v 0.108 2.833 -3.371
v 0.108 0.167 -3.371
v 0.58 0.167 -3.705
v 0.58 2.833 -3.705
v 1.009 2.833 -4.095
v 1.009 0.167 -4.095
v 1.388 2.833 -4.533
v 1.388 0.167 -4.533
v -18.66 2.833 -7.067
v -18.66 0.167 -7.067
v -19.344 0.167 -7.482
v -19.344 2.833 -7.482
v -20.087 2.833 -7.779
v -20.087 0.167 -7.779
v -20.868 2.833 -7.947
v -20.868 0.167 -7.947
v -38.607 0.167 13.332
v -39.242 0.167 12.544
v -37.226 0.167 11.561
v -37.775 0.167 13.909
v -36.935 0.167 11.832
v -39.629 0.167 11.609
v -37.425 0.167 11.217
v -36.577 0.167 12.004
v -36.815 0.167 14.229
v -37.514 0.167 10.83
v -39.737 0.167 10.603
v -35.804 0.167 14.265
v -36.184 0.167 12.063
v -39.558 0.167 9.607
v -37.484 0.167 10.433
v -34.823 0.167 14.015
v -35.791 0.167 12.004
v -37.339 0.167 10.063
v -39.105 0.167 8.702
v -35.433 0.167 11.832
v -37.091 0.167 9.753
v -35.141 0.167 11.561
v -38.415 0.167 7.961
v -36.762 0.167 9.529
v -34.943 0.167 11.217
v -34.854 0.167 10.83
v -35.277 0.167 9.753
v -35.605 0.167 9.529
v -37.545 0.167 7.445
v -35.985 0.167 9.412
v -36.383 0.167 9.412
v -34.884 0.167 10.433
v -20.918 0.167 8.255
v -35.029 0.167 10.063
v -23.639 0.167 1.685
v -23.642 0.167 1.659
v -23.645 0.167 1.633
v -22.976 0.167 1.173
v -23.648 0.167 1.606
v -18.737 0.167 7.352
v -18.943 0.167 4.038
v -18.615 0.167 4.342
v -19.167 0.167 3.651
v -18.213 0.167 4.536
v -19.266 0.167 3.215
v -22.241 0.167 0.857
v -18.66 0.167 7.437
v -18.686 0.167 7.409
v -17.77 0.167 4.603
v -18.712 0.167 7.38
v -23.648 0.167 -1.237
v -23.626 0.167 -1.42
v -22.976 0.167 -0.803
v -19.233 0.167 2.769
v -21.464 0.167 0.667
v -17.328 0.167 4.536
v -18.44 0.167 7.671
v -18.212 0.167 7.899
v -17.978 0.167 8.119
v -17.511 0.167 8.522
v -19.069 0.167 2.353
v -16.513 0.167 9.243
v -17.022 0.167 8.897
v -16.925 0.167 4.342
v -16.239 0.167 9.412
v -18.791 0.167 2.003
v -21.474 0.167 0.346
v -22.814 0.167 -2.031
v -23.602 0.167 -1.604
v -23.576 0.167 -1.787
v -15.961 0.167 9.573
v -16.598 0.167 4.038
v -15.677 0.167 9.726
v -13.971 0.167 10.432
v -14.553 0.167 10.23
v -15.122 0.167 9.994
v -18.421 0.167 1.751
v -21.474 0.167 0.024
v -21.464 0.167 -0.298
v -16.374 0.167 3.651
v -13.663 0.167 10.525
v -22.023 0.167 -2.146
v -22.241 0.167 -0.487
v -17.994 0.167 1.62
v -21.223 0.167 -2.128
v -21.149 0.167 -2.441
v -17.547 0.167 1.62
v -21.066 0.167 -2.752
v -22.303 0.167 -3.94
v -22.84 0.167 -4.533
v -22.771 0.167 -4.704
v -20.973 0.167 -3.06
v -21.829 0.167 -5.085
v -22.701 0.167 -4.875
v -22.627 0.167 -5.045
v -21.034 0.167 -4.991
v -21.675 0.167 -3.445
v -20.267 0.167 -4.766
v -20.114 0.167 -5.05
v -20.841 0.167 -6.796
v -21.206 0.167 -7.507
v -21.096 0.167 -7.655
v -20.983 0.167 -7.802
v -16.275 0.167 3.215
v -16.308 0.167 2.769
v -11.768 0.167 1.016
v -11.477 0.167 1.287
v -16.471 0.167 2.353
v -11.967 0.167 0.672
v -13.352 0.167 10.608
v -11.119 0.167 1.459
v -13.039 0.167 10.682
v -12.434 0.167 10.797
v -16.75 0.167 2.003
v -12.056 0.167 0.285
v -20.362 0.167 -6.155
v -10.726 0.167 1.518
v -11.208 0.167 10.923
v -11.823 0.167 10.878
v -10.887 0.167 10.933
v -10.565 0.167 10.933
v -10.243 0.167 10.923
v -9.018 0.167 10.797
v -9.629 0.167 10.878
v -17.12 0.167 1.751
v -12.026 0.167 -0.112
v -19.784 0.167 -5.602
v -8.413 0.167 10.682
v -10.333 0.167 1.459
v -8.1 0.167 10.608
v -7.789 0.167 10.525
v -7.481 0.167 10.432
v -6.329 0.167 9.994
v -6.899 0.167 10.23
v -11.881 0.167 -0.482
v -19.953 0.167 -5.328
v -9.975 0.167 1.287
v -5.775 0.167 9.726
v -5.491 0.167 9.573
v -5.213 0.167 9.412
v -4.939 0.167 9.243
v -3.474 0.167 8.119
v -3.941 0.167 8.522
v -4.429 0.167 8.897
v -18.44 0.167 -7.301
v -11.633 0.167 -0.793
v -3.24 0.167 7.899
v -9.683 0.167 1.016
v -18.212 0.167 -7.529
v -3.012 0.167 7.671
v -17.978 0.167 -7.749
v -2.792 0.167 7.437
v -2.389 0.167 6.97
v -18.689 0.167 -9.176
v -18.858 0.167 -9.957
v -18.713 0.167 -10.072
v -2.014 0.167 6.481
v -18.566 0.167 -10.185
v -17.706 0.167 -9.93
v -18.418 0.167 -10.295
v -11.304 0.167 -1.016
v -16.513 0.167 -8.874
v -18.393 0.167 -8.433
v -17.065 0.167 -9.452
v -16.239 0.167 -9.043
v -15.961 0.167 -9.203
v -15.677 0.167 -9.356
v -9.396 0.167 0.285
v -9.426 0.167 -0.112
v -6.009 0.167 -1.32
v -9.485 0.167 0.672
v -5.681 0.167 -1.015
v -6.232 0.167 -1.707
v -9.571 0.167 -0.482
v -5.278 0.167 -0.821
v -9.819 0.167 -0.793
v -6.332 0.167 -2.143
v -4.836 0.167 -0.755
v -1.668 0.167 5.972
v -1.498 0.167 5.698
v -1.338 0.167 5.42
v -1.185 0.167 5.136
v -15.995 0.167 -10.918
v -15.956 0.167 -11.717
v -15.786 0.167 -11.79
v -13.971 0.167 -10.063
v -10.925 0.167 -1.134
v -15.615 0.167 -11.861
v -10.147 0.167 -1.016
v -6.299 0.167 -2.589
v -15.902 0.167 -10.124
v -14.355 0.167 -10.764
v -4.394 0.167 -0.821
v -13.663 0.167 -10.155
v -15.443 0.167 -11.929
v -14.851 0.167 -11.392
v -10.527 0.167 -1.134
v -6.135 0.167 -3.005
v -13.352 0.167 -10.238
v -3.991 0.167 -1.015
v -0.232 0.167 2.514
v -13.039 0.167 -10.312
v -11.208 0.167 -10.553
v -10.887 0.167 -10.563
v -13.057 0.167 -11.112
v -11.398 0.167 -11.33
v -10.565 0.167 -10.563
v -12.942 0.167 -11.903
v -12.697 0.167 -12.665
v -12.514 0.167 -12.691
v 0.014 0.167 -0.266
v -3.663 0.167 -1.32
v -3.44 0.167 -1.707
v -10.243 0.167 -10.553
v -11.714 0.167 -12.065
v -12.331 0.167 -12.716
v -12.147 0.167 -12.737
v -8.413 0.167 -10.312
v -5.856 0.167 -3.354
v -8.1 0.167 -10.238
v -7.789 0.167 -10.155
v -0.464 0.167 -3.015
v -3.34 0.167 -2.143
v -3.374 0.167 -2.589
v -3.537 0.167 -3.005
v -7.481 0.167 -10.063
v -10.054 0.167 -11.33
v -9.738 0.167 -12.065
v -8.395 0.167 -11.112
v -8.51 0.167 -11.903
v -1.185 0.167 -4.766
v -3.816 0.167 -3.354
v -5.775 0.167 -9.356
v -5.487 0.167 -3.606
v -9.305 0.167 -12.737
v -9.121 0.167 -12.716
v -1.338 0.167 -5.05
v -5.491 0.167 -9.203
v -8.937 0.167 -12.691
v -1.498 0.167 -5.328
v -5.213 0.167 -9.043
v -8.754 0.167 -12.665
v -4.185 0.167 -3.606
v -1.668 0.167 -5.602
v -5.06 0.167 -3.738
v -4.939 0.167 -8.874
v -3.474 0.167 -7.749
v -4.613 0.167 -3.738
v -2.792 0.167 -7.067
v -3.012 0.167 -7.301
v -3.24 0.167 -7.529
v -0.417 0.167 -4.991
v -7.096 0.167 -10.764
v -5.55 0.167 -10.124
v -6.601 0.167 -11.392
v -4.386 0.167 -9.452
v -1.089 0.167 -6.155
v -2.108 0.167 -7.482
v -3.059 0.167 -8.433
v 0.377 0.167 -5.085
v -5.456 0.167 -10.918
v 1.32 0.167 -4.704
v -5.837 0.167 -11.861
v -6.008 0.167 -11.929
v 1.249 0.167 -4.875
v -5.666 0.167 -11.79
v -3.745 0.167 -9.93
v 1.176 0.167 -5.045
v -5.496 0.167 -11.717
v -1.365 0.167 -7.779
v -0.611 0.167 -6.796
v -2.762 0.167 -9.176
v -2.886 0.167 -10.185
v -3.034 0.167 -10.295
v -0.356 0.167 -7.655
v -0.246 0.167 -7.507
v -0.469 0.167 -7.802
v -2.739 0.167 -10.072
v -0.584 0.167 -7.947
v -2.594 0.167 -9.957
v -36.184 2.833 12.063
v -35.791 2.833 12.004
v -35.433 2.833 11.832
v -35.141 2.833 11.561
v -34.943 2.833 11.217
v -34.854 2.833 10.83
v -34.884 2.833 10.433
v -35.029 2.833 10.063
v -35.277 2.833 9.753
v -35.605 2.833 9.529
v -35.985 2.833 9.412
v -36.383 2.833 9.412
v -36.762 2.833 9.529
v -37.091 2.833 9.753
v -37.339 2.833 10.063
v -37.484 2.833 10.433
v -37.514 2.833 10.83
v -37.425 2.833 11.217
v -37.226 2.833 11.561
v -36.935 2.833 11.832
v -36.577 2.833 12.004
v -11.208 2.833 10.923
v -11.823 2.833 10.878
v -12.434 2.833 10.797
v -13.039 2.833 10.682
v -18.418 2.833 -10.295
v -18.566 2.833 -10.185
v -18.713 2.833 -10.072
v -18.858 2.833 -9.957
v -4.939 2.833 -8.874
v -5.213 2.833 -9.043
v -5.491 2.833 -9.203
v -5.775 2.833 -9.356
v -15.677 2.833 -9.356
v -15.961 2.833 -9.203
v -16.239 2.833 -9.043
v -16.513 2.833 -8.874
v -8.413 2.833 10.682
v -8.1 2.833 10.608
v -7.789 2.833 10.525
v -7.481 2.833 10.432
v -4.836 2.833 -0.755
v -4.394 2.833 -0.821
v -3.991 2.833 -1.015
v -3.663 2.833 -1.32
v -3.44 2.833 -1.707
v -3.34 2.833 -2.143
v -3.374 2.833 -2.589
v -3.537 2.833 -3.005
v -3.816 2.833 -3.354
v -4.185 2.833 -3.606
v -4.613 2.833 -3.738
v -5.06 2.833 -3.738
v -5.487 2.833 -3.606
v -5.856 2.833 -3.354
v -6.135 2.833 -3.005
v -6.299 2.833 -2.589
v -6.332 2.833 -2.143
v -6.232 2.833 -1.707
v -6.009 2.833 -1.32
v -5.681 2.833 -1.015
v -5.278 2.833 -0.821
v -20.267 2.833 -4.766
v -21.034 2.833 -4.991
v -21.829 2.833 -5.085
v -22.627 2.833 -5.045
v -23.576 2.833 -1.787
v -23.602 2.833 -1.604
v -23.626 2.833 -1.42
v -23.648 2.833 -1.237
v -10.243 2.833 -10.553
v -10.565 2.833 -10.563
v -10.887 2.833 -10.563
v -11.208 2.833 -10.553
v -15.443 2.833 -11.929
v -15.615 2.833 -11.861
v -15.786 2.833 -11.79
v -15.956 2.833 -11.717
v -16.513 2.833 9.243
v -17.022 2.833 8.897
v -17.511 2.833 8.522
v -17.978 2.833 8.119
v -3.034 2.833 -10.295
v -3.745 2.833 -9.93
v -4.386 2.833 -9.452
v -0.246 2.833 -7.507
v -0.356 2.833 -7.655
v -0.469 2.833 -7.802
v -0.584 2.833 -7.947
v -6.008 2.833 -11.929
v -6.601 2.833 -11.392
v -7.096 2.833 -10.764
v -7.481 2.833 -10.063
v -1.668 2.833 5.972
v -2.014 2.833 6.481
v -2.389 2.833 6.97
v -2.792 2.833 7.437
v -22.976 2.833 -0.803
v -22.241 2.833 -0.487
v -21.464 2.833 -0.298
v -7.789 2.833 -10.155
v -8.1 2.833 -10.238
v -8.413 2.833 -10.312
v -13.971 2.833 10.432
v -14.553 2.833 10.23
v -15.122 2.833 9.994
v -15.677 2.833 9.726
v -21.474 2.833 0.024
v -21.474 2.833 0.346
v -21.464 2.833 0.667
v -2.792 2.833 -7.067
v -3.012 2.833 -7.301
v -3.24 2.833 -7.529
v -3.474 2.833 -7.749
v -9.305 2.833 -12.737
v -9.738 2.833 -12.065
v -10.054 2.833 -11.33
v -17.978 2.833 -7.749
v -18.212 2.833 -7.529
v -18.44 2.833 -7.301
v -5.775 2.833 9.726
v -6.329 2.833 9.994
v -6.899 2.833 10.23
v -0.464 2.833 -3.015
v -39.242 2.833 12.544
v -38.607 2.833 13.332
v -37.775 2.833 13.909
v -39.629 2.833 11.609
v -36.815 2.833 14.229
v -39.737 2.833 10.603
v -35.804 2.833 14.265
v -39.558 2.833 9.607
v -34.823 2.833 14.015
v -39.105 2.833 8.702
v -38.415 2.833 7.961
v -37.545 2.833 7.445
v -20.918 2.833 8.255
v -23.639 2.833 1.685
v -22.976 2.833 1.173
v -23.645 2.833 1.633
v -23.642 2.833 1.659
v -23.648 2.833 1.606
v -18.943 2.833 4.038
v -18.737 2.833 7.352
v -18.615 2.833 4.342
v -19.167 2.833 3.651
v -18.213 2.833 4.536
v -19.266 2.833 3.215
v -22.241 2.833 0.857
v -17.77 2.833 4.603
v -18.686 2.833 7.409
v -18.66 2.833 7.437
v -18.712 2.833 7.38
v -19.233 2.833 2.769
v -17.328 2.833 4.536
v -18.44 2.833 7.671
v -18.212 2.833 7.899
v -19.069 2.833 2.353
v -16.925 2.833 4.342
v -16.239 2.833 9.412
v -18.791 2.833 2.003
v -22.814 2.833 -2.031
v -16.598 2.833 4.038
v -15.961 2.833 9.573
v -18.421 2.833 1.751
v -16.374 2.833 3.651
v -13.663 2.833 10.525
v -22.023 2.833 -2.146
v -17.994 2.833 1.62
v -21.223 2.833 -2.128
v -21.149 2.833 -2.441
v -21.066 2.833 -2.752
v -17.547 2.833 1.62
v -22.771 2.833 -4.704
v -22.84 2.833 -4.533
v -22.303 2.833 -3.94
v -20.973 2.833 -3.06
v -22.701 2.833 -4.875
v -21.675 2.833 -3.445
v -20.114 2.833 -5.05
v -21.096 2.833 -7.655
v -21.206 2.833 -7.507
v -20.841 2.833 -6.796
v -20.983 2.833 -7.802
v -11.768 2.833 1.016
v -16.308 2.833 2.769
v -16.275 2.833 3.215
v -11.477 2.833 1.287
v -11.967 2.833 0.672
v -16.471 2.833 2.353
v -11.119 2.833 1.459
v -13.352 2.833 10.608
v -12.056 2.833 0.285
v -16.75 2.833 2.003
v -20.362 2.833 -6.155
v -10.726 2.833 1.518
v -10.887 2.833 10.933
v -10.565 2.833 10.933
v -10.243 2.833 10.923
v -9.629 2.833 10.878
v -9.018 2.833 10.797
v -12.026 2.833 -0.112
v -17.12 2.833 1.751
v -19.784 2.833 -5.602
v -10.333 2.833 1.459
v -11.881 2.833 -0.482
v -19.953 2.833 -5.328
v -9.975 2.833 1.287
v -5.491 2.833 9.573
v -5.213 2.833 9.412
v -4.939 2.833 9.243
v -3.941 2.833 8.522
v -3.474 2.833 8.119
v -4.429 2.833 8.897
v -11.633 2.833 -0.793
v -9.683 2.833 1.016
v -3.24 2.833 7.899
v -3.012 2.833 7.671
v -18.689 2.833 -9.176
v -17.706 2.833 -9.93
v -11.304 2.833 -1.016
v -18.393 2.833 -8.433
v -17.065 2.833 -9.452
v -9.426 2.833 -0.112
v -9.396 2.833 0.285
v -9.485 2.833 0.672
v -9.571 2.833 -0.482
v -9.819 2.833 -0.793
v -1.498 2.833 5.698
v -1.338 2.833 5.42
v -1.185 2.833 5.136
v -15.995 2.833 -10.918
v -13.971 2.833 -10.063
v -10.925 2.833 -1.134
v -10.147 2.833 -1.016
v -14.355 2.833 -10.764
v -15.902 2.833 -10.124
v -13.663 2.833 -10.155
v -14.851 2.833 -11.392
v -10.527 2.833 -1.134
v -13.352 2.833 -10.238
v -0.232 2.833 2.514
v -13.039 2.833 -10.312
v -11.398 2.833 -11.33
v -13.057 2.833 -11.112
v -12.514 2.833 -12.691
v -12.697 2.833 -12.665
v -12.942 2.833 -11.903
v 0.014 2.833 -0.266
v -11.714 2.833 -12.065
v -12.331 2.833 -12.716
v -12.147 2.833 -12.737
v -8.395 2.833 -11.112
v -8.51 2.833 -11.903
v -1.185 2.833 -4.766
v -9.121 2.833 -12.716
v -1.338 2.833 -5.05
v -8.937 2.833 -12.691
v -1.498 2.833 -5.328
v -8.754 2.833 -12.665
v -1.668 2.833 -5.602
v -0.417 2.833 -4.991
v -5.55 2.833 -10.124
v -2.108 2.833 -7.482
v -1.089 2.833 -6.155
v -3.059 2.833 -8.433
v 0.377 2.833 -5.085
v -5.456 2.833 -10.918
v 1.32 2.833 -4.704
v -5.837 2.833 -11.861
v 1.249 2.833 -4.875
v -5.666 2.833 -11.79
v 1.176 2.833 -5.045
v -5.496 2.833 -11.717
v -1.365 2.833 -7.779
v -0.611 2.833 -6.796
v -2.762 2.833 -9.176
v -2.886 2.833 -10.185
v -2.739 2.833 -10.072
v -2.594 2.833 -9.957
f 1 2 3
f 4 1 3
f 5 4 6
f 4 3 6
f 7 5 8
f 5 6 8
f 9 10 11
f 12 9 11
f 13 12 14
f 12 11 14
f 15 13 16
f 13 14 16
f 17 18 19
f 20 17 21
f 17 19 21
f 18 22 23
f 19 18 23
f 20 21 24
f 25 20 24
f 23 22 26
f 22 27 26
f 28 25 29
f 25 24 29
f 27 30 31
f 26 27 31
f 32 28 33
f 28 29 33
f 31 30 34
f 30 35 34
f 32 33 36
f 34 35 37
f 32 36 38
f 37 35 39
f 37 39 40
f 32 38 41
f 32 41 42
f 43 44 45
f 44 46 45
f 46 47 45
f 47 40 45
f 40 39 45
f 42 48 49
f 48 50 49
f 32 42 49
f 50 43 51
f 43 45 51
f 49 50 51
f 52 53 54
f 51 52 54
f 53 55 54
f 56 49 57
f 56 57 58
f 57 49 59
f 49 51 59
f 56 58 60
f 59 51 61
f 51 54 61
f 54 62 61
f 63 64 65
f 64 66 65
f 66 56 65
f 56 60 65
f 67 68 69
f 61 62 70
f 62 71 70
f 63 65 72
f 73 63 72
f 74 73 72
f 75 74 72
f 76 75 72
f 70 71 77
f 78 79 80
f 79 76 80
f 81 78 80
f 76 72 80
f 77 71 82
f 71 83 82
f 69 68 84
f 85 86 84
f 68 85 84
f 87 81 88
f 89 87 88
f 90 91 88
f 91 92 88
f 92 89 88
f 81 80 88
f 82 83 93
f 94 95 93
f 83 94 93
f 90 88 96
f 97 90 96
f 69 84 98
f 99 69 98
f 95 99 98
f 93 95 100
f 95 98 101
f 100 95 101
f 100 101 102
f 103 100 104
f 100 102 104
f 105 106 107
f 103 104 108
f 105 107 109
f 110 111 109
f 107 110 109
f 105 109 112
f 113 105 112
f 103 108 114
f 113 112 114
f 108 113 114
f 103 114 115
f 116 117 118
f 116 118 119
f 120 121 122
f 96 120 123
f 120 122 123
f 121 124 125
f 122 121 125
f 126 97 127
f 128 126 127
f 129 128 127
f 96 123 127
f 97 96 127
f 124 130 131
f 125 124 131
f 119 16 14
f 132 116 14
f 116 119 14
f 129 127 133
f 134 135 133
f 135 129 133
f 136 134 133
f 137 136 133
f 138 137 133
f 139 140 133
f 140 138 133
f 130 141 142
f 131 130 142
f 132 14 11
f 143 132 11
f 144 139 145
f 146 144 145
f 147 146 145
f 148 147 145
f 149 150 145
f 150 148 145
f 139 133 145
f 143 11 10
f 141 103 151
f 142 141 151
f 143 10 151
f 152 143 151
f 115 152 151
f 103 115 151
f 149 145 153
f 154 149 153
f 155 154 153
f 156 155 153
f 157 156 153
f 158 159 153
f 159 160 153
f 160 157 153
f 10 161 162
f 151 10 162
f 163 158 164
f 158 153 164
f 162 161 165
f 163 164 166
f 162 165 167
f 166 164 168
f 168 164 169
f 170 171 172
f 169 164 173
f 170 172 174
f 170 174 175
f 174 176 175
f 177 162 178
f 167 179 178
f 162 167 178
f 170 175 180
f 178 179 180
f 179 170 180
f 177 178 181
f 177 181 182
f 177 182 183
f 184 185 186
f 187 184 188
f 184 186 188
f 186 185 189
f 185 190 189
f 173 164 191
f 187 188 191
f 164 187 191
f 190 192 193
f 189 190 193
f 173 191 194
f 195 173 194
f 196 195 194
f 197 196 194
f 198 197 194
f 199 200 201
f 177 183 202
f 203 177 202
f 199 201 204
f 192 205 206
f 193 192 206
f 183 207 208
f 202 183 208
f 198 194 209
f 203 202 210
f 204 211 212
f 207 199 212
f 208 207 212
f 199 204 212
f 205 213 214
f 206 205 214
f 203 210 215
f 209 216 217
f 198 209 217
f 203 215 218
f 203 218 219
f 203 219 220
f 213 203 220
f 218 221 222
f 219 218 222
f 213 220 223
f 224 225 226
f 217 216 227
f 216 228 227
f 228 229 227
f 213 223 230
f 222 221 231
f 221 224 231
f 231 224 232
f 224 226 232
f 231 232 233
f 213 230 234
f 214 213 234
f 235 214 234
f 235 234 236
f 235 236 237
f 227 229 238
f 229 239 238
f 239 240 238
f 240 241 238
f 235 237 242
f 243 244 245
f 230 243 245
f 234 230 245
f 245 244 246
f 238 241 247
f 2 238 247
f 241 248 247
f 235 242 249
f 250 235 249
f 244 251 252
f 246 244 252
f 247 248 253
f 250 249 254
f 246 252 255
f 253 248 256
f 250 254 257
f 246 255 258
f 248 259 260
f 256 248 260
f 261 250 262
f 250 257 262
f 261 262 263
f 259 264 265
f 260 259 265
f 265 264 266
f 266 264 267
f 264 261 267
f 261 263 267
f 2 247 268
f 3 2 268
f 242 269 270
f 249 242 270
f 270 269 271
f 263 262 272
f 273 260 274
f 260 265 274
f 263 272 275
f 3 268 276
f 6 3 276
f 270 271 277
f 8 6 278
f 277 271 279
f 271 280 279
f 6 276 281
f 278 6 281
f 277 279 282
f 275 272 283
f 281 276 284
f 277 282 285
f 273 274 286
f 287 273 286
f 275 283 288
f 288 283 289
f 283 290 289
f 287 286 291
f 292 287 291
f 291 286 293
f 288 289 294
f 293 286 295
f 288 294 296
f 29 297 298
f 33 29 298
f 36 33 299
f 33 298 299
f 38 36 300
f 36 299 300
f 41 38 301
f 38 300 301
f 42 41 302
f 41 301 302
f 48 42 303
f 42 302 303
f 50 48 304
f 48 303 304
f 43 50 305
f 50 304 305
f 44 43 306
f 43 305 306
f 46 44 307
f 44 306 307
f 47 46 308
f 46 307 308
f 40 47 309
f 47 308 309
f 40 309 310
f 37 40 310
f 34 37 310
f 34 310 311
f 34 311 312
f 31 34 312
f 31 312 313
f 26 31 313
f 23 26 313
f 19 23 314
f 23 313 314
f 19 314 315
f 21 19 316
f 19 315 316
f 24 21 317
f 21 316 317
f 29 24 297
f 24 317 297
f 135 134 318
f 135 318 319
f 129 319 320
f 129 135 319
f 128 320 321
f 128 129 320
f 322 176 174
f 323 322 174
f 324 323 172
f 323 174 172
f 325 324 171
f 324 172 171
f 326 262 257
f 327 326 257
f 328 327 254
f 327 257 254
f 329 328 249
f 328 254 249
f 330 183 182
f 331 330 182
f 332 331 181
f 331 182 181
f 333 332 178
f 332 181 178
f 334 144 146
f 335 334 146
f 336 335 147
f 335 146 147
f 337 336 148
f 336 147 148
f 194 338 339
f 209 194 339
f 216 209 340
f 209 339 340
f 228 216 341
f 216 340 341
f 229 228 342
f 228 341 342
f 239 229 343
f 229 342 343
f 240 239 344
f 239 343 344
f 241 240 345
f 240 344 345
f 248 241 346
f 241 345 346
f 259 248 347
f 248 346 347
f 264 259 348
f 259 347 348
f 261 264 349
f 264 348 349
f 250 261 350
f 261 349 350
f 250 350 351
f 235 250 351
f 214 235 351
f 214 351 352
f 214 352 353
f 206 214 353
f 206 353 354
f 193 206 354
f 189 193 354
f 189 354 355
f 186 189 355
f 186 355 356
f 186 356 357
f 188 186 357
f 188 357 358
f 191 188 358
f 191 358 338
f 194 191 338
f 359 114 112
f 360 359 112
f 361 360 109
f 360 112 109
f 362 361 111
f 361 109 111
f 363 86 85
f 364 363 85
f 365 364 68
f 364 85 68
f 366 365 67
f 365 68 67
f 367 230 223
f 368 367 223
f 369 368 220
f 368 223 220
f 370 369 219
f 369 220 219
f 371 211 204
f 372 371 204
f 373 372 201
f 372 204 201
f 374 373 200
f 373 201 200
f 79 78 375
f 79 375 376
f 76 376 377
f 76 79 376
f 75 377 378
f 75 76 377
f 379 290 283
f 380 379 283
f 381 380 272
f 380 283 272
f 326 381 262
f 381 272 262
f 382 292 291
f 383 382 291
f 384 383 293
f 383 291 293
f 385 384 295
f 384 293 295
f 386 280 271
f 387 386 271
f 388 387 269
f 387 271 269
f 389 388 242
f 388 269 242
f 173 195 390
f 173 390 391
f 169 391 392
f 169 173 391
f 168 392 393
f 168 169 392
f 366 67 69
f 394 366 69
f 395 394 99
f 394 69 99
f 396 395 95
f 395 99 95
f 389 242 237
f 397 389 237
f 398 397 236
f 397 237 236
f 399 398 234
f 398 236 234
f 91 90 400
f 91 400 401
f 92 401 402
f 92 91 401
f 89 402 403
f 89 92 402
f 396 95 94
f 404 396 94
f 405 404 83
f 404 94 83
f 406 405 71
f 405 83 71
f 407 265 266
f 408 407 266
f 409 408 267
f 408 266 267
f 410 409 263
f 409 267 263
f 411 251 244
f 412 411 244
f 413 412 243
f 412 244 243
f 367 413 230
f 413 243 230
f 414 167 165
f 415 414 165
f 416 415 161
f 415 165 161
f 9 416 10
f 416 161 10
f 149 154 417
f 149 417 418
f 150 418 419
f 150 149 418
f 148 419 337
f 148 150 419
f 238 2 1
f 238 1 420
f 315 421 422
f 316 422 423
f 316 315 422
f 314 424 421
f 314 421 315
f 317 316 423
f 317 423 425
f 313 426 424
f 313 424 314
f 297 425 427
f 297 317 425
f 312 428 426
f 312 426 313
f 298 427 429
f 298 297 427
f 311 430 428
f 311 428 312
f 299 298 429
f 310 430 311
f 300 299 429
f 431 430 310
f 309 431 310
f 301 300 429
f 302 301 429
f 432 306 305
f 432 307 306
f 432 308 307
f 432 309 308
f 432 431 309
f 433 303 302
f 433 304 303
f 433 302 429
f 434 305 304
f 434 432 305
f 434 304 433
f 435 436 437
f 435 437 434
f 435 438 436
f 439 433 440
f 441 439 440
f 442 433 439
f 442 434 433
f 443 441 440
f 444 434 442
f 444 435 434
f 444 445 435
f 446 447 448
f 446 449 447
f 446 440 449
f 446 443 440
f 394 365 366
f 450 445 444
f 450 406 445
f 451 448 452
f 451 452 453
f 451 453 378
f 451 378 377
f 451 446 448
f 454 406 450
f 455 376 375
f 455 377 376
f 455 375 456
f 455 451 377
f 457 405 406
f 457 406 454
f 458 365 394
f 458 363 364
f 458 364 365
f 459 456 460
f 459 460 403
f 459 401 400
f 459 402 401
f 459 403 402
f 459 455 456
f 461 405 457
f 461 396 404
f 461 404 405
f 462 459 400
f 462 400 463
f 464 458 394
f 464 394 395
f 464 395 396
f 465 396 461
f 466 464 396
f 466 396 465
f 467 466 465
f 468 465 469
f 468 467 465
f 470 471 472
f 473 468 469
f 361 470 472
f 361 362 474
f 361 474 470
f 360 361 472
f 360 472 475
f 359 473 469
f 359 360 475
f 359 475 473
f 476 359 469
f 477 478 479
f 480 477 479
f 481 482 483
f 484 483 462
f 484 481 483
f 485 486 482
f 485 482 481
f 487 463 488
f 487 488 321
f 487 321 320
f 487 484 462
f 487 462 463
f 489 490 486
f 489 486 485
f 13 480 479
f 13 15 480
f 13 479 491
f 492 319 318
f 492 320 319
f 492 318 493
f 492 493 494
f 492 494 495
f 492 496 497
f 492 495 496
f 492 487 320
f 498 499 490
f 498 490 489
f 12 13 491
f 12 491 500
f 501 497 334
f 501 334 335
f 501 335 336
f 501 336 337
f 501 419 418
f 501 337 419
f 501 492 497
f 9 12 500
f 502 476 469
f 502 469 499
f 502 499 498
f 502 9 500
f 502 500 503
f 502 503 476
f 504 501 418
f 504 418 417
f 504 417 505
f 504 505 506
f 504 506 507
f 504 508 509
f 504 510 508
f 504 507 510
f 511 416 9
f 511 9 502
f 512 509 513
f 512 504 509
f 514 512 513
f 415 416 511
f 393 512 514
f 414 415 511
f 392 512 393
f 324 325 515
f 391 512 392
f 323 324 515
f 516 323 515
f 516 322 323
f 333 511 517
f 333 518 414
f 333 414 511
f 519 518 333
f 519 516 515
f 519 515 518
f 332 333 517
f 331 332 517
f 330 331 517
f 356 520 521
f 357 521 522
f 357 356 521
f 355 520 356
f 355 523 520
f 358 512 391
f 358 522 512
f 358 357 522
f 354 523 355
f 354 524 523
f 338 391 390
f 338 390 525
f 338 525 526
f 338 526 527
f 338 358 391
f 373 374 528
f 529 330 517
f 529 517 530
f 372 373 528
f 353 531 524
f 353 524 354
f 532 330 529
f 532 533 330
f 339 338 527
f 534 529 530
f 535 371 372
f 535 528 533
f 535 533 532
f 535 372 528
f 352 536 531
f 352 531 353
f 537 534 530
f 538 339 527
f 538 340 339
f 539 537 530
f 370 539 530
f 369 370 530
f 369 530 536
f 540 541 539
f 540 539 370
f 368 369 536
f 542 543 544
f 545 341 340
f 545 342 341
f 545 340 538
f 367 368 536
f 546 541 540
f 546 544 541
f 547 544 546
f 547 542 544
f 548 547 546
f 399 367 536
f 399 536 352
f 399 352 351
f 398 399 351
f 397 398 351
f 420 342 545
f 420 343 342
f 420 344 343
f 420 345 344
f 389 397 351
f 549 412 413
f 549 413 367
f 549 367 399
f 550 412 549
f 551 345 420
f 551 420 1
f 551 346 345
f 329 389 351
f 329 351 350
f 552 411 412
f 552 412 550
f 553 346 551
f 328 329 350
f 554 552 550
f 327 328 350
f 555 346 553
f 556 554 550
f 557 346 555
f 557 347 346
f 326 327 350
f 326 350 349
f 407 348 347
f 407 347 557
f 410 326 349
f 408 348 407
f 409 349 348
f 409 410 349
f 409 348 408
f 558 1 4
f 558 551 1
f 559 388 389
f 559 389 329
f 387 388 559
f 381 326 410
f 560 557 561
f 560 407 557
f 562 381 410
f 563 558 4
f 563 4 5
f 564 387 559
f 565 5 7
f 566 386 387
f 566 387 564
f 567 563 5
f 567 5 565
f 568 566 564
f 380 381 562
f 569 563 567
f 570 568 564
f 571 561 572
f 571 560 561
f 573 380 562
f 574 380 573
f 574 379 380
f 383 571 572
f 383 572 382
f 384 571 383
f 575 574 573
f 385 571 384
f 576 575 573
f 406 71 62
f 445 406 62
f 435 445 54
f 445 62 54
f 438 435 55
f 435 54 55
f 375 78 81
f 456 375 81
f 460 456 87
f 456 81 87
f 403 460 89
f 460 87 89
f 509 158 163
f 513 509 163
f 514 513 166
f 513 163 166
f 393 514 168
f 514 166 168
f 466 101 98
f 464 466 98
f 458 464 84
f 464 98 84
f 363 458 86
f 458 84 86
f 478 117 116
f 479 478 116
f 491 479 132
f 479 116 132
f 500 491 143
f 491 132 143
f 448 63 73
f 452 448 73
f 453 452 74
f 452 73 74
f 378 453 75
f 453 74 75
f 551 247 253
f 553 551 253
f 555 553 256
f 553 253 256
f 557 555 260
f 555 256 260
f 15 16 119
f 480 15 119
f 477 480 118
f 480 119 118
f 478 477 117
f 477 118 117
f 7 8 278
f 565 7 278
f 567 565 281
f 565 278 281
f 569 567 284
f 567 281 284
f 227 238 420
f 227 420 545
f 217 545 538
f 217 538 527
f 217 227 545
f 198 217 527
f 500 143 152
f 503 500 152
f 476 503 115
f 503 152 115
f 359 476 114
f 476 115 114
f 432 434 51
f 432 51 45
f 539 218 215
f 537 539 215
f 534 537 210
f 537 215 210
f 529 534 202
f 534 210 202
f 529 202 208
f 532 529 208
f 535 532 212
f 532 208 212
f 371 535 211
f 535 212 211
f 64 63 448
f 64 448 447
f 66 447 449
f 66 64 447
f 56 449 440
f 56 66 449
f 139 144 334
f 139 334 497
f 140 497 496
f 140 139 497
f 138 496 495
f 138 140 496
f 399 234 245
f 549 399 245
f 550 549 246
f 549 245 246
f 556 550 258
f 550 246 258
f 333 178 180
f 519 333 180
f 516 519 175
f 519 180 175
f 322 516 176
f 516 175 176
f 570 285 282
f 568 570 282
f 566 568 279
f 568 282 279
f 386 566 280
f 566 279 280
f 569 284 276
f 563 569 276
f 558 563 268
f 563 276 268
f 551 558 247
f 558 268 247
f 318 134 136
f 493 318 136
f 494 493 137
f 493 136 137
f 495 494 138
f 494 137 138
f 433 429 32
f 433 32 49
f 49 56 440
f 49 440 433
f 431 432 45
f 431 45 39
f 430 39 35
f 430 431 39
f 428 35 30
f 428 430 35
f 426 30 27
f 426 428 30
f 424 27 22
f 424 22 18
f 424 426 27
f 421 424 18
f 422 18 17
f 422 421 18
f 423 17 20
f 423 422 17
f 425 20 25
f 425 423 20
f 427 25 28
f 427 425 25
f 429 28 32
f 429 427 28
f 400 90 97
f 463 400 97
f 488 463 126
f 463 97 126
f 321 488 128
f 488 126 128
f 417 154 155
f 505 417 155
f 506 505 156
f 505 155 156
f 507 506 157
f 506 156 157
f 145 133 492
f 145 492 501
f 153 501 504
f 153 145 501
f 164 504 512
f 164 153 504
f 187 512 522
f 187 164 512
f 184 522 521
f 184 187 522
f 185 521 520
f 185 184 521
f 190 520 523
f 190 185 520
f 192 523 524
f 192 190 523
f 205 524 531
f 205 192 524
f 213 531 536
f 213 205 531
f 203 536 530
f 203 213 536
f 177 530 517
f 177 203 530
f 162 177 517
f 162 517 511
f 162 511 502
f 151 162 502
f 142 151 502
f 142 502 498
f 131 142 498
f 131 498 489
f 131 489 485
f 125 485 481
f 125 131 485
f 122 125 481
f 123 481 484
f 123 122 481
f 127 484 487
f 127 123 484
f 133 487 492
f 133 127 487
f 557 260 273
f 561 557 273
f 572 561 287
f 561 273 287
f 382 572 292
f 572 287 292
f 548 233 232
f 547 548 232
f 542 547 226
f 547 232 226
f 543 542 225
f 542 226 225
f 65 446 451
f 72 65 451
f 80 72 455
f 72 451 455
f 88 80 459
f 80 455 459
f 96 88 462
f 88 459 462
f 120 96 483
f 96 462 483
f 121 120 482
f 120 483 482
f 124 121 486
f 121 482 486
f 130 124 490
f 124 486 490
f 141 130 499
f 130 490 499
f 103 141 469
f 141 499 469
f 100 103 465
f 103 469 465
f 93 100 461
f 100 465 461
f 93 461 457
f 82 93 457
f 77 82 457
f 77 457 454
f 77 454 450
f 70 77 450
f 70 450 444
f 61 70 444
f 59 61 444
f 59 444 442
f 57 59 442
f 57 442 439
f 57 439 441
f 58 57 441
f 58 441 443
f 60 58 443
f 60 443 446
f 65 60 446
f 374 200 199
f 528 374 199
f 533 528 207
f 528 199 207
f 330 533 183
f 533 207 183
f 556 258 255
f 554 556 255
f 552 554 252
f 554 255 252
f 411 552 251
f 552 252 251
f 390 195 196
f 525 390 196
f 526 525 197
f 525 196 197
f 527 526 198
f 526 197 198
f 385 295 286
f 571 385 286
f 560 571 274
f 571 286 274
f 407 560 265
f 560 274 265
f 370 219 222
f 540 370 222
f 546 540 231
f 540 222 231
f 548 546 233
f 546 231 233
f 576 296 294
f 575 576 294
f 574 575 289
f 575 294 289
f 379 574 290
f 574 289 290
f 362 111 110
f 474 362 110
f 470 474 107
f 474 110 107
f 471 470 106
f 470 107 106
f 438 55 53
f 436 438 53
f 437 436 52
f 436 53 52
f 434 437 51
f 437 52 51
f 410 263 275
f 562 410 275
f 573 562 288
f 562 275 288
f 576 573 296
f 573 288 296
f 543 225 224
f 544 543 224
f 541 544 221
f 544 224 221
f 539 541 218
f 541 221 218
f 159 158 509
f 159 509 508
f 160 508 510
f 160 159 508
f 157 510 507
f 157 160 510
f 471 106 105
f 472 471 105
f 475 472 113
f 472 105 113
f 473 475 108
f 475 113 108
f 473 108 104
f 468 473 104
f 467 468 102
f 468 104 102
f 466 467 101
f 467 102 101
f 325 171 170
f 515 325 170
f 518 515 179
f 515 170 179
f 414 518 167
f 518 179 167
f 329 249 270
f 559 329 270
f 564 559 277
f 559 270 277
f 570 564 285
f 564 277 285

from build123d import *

# Parameters (mm, degrees)
SKETCH1_R              = 1.5
BOSS_EXTRUDE1_DEPTH    = 3
SKETCH3_R              = 1.5
BOSS_EXTRUDE2_DEPTH    = 3
CUT_EXTRUDE1_OUTLINE_R = 1.5
CUT_EXTRUDE1_DEPTH     = 3
SCALE1_SCALE           = 0.888888889
BOSS_EXTRUDE3_START    = -2.666666667
SKETCH5_R              = 1.333333333
BOSS_EXTRUDE3_DEPTH    = 2.666666667
SKETCH6_R              = 1.5
CUT_EXTRUDE2_DEPTH     = 10


# Read off the part's stored shape, not the designer's step: Cut-Extrude1
with BuildPart() as part:
    # Sketch1 → Boss-Extrude1 (new body)
    with BuildSketch(Plane(origin=(0, 0, 0), x_dir=(1, 0, 0), z_dir=(0, 1, 0))):
        with BuildLine():
            Line((20.643657446, 4), (2.081641936, 4))
            ThreePointArc((2.081641936, 4), (2.861028333, 4.588201733), (3.521749436, 5.30713988))
            ThreePointArc((3.521749436, 5.30713988), (3.405395609, 5.596745198), (3.282888305, 5.883801663))
            ThreePointArc((3.282888305, 5.883801663), (1.93527598, 5.894040025), (0.627094961, 5.57027124))
            ThreePointArc((0.627094961, 5.57027124), (0.366286148, 6.046375), (0.084372603, 6.510293938))
            ThreePointArc((0.084372603, 6.510293938), (1.018855105, 7.48132754), (1.683794586, 8.65351323))
            ThreePointArc((1.683794586, 8.65351323), (1.496450048, 8.903135899), (1.303821399, 9.148703928))
            ThreePointArc((1.303821399, 9.148703928), (-0.000522033, 8.809805691), (-1.180330337, 8.158486898))
            ThreePointArc((-1.180330337, 8.158486898), (-1.555477026, 8.550865528), (-1.947855656, 8.926012217))
            ThreePointArc((-1.947855656, 8.926012217), (-1.296536862, 10.105820521), (-0.957638625, 11.410163953))
            ThreePointArc((-0.957638625, 11.410163953), (-1.203206655, 11.602792602), (-1.452829324, 11.79013714))
            ThreePointArc((-1.452829324, 11.79013714), (-2.625015014, 11.125197659), (-3.596048616, 10.190715157))
            ThreePointArc((-3.596048616, 10.190715157), (-4.059967554, 10.472628702), (-4.536071314, 10.733437515))
            ThreePointArc((-4.536071314, 10.733437515), (-4.212302529, 12.041618533), (-4.222540891, 13.389230859))
            ThreePointArc((-4.222540891, 13.389230859), (-4.509597355, 13.511738163), (-4.799202674, 13.62809199))
            ThreePointArc((-4.799202674, 13.62809199), (-5.759348103, 12.682425791), (-6.455432668, 11.528463019))
            ThreePointArc((-6.455432668, 11.528463019), (-6.976508546, 11.680699536), (-7.503891752, 11.809396783))
            ThreePointArc((-7.503891752, 11.809396783), (-7.529737283, 13.156800143), (-7.888414517, 14.455843809))
            ThreePointArc((-7.888414517, 14.455843809), (-8.197396993, 14.499881098), (-8.507248835, 14.537314892))
            ThreePointArc((-8.507248835, 14.537314892), (-9.18992168, 13.375367565), (-9.563620196, 12.080565177))
            ThreePointArc((-9.563620196, 12.080565177), (-10.106342554, 12.09275), (-10.649064912, 12.080565177))
            ThreePointArc((-10.649064912, 12.080565177), (-11.022763428, 13.375367565), (-11.705436272, 14.537314892))
            ThreePointArc((-11.705436272, 14.537314892), (-12.015288115, 14.499881098), (-12.324270591, 14.455843809))
            ThreePointArc((-12.324270591, 14.455843809), (-12.682947825, 13.156800143), (-12.708793355, 11.809396783))
            ThreePointArc((-12.708793355, 11.809396783), (-13.236176561, 11.680699536), (-13.757252439, 11.528463019))
            ThreePointArc((-13.757252439, 11.528463019), (-14.453337005, 12.682425791), (-15.413482434, 13.62809199))
            ThreePointArc((-15.413482434, 13.62809199), (-15.703087752, 13.511738163), (-15.990144217, 13.389230859))
            ThreePointArc((-15.990144217, 13.389230859), (-16.000382579, 12.041618533), (-15.676613793, 10.733437515))
            ThreePointArc((-15.676613793, 10.733437515), (-16.152717554, 10.472628702), (-16.616636492, 10.190715157))
            ThreePointArc((-16.616636492, 10.190715157), (-17.587670094, 11.125197659), (-18.759855783, 11.79013714))
            ThreePointArc((-18.759855783, 11.79013714), (-19.009478453, 11.602792602), (-19.255046482, 11.410163953))
            ThreePointArc((-19.255046482, 11.410163953), (-18.916148245, 10.105820521), (-18.264829452, 8.926012217))
            ThreePointArc((-18.264829452, 8.926012217), (-18.657208082, 8.550865528), (-19.032354771, 8.158486898))
            ThreePointArc((-19.032354771, 8.158486898), (-20.212163074, 8.809805691), (-21.516506507, 9.148703928))
            ThreePointArc((-21.516506507, 9.148703928), (-21.709135156, 8.903135899), (-21.896479694, 8.65351323))
            ThreePointArc((-21.896479694, 8.65351323), (-21.231540213, 7.48132754), (-20.297057711, 6.510293938))
            ThreePointArc((-20.297057711, 6.510293938), (-20.578971255, 6.046375), (-20.839780068, 5.57027124))
            ThreePointArc((-20.839780068, 5.57027124), (-22.147961087, 5.894040025), (-23.495573413, 5.883801663))
            ThreePointArc((-23.495573413, 5.883801663), (-23.618080717, 5.596745198), (-23.734434544, 5.30713988))
            ThreePointArc((-23.734434544, 5.30713988), (-22.788768345, 4.346994451), (-21.634805572, 3.650909885))
            ThreePointArc((-21.634805572, 3.650909885), (-21.78704209, 3.129834008), (-21.915739337, 2.602450802))
            ThreePointArc((-21.915739337, 2.602450802), (-23.263142697, 2.576605271), (-24.562186363, 2.217928037))
            ThreePointArc((-24.562186363, 2.217928037), (-24.606223651, 1.908945561), (-24.643657446, 1.599093719))
            ThreePointArc((-24.643657446, 1.599093719), (-23.481710119, 0.916420874), (-22.186907731, 0.542722358))
            ThreePointArc((-22.186907731, 0.542722358), (-22.199092554, 0), (-22.186907731, -0.542722358))
            ThreePointArc((-22.186907731, -0.542722358), (-23.481710119, -0.916420874), (-24.643657446, -1.599093719))
            ThreePointArc((-24.643657446, -1.599093719), (-24.606223651, -1.908945561), (-24.562186363, -2.217928037))
            ThreePointArc((-24.562186363, -2.217928037), (-23.263142697, -2.576605271), (-21.915739337, -2.602450802))
            ThreePointArc((-21.915739337, -2.602450802), (-21.78704209, -3.129834008), (-21.634805572, -3.650909885))
            ThreePointArc((-21.634805572, -3.650909885), (-22.788768345, -4.346994451), (-23.734434544, -5.30713988))
            ThreePointArc((-23.734434544, -5.30713988), (-23.618080717, -5.596745198), (-23.495573413, -5.883801663))
            ThreePointArc((-23.495573413, -5.883801663), (-22.147961087, -5.894040025), (-20.839780068, -5.57027124))
            ThreePointArc((-20.839780068, -5.57027124), (-20.578971255, -6.046375), (-20.297057711, -6.510293938))
            ThreePointArc((-20.297057711, -6.510293938), (-21.231540213, -7.48132754), (-21.896479694, -8.65351323))
            ThreePointArc((-21.896479694, -8.65351323), (-21.709135156, -8.903135899), (-21.516506507, -9.148703928))
            ThreePointArc((-21.516506507, -9.148703928), (-20.212163074, -8.809805691), (-19.032354771, -8.158486898))
            ThreePointArc((-19.032354771, -8.158486898), (-18.657208082, -8.550865528), (-18.264829452, -8.926012217))
            ThreePointArc((-18.264829452, -8.926012217), (-18.916148245, -10.105820521), (-19.255046482, -11.410163953))
            ThreePointArc((-19.255046482, -11.410163953), (-19.009478453, -11.602792602), (-18.759855783, -11.79013714))
            ThreePointArc((-18.759855783, -11.79013714), (-17.587670094, -11.125197659), (-16.616636492, -10.190715157))
            ThreePointArc((-16.616636492, -10.190715157), (-16.152717554, -10.472628702), (-15.676613793, -10.733437515))
            ThreePointArc((-15.676613793, -10.733437515), (-16.000382579, -12.041618533), (-15.990144217, -13.389230859))
            ThreePointArc((-15.990144217, -13.389230859), (-15.703087752, -13.511738163), (-15.413482434, -13.62809199))
            ThreePointArc((-15.413482434, -13.62809199), (-14.453337005, -12.682425791), (-13.757252439, -11.528463019))
            ThreePointArc((-13.757252439, -11.528463019), (-13.236176561, -11.680699536), (-12.708793355, -11.809396783))
            ThreePointArc((-12.708793355, -11.809396783), (-12.682947825, -13.156800143), (-12.324270591, -14.455843809))
            ThreePointArc((-12.324270591, -14.455843809), (-12.015288115, -14.499881098), (-11.705436272, -14.537314892))
            ThreePointArc((-11.705436272, -14.537314892), (-11.022763428, -13.375367565), (-10.649064912, -12.080565177))
            ThreePointArc((-10.649064912, -12.080565177), (-10.106342554, -12.09275), (-9.563620196, -12.080565177))
            ThreePointArc((-9.563620196, -12.080565177), (-9.18992168, -13.375367565), (-8.507248835, -14.537314892))
            ThreePointArc((-8.507248835, -14.537314892), (-8.197396993, -14.499881098), (-7.888414517, -14.455843809))
            ThreePointArc((-7.888414517, -14.455843809), (-7.529737283, -13.156800143), (-7.503891752, -11.809396783))
            ThreePointArc((-7.503891752, -11.809396783), (-6.976508546, -11.680699536), (-6.455432668, -11.528463019))
            ThreePointArc((-6.455432668, -11.528463019), (-5.759348103, -12.682425791), (-4.799202674, -13.62809199))
            ThreePointArc((-4.799202674, -13.62809199), (-4.509597355, -13.511738163), (-4.222540891, -13.389230859))
            ThreePointArc((-4.222540891, -13.389230859), (-4.212302529, -12.041618533), (-4.536071314, -10.733437515))
            ThreePointArc((-4.536071314, -10.733437515), (-4.059967554, -10.472628702), (-3.596048616, -10.190715157))
            ThreePointArc((-3.596048616, -10.190715157), (-2.625015014, -11.125197659), (-1.452829324, -11.79013714))
            ThreePointArc((-1.452829324, -11.79013714), (-1.203206655, -11.602792602), (-0.957638625, -11.410163953))
            ThreePointArc((-0.957638625, -11.410163953), (-1.296536862, -10.105820521), (-1.947855656, -8.926012217))
            ThreePointArc((-1.947855656, -8.926012217), (-1.555477026, -8.550865528), (-1.180330337, -8.158486898))
            ThreePointArc((-1.180330337, -8.158486898), (-0.000522033, -8.809805691), (1.303821399, -9.148703928))
            ThreePointArc((1.303821399, -9.148703928), (1.496450048, -8.903135899), (1.683794586, -8.65351323))
            ThreePointArc((1.683794586, -8.65351323), (1.018855105, -7.48132754), (0.084372603, -6.510293938))
            ThreePointArc((0.084372603, -6.510293938), (0.366286148, -6.046375), (0.627094961, -5.57027124))
            ThreePointArc((0.627094961, -5.57027124), (1.93527598, -5.894040025), (3.282888305, -5.883801663))
            ThreePointArc((3.282888305, -5.883801663), (3.405395609, -5.596745198), (3.521749436, -5.30713988))
            ThreePointArc((3.521749436, -5.30713988), (2.861028333, -4.588201733), (2.081641936, -4))
            Line((2.081641936, -4), (20.643657446, -4))
            ThreePointArc((20.643657446, -4), (24.643657446, 0), (20.643657446, 4))
        make_face()
        with Locations(Location((-10.106342554, 0, 0), (0, 0, 270))):
            Circle(SKETCH1_R, mode=Mode.SUBTRACT)
        with Locations(Location((20.643657446, 0, 0), (0, 0, 270))):
            Circle(SKETCH1_R, mode=Mode.SUBTRACT)
    extrude(amount=BOSS_EXTRUDE1_DEPTH)

    # Sketch3 → Boss-Extrude2 (add)
    with BuildSketch(Plane(origin=(0, 3, 0), x_dir=(1, 0, 0), z_dir=(0, 1, 0))):
        with BuildLine():
            Line((-14.106342554, 0), (-20.558846273, 0))
            Line((-20.558846273, 0), (-40.277341791, -8.167668273))
            ThreePointArc((-40.277341791, -8.167668273), (-42.442126192, -13.393920133), (-37.215874332, -15.558704533))
            Line((-37.215874332, -15.558704533), (-8.575608824, -3.69551813))
            ThreePointArc((-8.575608824, -3.69551813), (-12.328623486, -3.325878449), (-14.106342554, 0))
        make_face()
        with Locations(Location((-38.746608062, -11.863186403, 0), (0, 0, 270))):
            Circle(SKETCH3_R, mode=Mode.SUBTRACT)
    extrude(amount=-BOSS_EXTRUDE2_DEPTH)

    # Cut-Extrude1 outline → Cut-Extrude1 (cut)
    # profile 1 of 11: a face of its own
    with BuildSketch(Plane(origin=(0, 0, 0), x_dir=(1, 0, 0), z_dir=(0, 1, 0))):
        with BuildLine():
            Line((2.081641936, 4), (1.43808022, 3.600125745))
            ThreePointArc((1.43808022, 3.600125745), (1.939395695, -1.065266441), (0.627094961, -5.57027124))
            ThreePointArc((0.627094961, -5.57027124), (1.93527598, -5.894040025), (3.282888305, -5.883801663))
            ThreePointArc((3.282888305, -5.883801663), (3.405395609, -5.596745198), (3.521749436, -5.30713988))
            ThreePointArc((3.521749436, -5.30713988), (2.861028333, -4.588201733), (2.081641936, -4))
            Line((2.081641936, -4), (20.643657446, -4))
            ThreePointArc((20.643657446, -4), (24.643657446, 0), (20.643657446, 4))
            Line((20.643657446, 4), (2.081641936, 4))
        make_face()
        with Locations((20.643657446, 0)):
            Circle(CUT_EXTRUDE1_OUTLINE_R, mode=Mode.SUBTRACT)
    # profile 2 of 11: a face of its own
    with BuildSketch(Plane(origin=(0, 0, 0), x_dir=(1, 0, 0), z_dir=(0, 1, 0))):
        with BuildLine():
            ThreePointArc((-21.516506507, -9.148703928), (-20.212163075, -8.809805691), (-19.032354771, -8.158486898))
            ThreePointArc((-19.032354771, -8.158486898), (-19.075783612, -8.110716964), (-19.118956803, -8.062715855))
            Line((-19.118956803, -8.062715855), (-21.572155055, -9.078863843))
            ThreePointArc((-21.572155055, -9.078863843), (-21.544384086, -9.113826359), (-21.516506507, -9.148703928))
        make_face()
    # profile 3 of 11: a face of its own
    with BuildSketch(Plane(origin=(0, 0, 0), x_dir=(1, 0, 0), z_dir=(0, 1, 0))):
        with BuildLine():
            ThreePointArc((-18.759855783, -11.79013714), (-17.587670094, -11.125197659), (-16.616636492, -10.190715157))
            ThreePointArc((-16.616636492, -10.190715157), (-17.467942325, -9.593823606), (-18.264829452, -8.926012217))
            ThreePointArc((-18.264829452, -8.926012217), (-18.916148245, -10.105820521), (-19.255046482, -11.410163953))
            ThreePointArc((-19.255046482, -11.410163953), (-19.009478453, -11.602792602), (-18.759855783, -11.79013714))
        make_face()
    # profile 4 of 11: a face of its own
    with BuildSketch(Plane(origin=(0, 0, 0), x_dir=(1, 0, 0), z_dir=(0, 1, 0))):
        with BuildLine():
            ThreePointArc((-15.413482434, -13.62809199), (-14.453337005, -12.682425791), (-13.757252439, -11.528463019))
            ThreePointArc((-13.757252439, -11.528463019), (-14.73403763, -11.172244217), (-15.676613793, -10.733437515))
            ThreePointArc((-15.676613793, -10.733437515), (-16.000382579, -12.041618533), (-15.990144217, -13.389230859))
            ThreePointArc((-15.990144217, -13.389230859), (-15.703087752, -13.511738163), (-15.413482434, -13.62809199))
        make_face()
    # profile 5 of 11: a face of its own
    with BuildSketch(Plane(origin=(0, 0, 0), x_dir=(1, 0, 0), z_dir=(0, 1, 0))):
        with BuildLine():
            ThreePointArc((-11.705436272, -14.537314892), (-11.022763428, -13.375367565), (-10.649064912, -12.080565177))
            ThreePointArc((-10.649064912, -12.080565177), (-11.684763165, -11.989294847), (-12.708793355, -11.809396783))
            ThreePointArc((-12.708793355, -11.809396783), (-12.682947825, -13.156800143), (-12.324270591, -14.455843809))
            ThreePointArc((-12.324270591, -14.455843809), (-12.015288115, -14.499881098), (-11.705436272, -14.537314892))
        make_face()
    # profile 6 of 11: a face of its own
    with BuildSketch(Plane(origin=(0, 0, 0), x_dir=(1, 0, 0), z_dir=(0, 1, 0))):
        with BuildLine():
            ThreePointArc((-7.888414517, -14.455843809), (-7.529737283, -13.156800143), (-7.503891752, -11.809396783))
            ThreePointArc((-7.503891752, -11.809396783), (-8.527921943, -11.989294847), (-9.563620196, -12.080565177))
            ThreePointArc((-9.563620196, -12.080565177), (-9.18992168, -13.375367565), (-8.507248835, -14.537314892))
            ThreePointArc((-8.507248835, -14.537314892), (-8.197396993, -14.499881098), (-7.888414517, -14.455843809))
        make_face()
    # profile 7 of 11: a face of its own
    with BuildSketch(Plane(origin=(0, 0, 0), x_dir=(1, 0, 0), z_dir=(0, 1, 0))):
        with BuildLine():
            ThreePointArc((-4.222540891, -13.389230859), (-4.212302529, -12.041618534), (-4.536071314, -10.733437515))
            ThreePointArc((-4.536071314, -10.733437515), (-5.478647477, -11.172244217), (-6.455432668, -11.528463019))
            ThreePointArc((-6.455432668, -11.528463019), (-5.759348103, -12.682425792), (-4.799202674, -13.62809199))
            ThreePointArc((-4.799202674, -13.62809199), (-4.509597356, -13.511738163), (-4.222540891, -13.389230859))
        make_face()
    # profile 8 of 11: a face of its own
    with BuildSketch(Plane(origin=(0, 0, 0), x_dir=(1, 0, 0), z_dir=(0, 1, 0))):
        with BuildLine():
            ThreePointArc((-0.957638625, -11.410163953), (-1.296536862, -10.105820521), (-1.947855656, -8.926012217))
            ThreePointArc((-1.947855656, -8.926012217), (-2.744742783, -9.593823606), (-3.596048616, -10.190715157))
            ThreePointArc((-3.596048616, -10.190715157), (-2.625015014, -11.125197659), (-1.452829324, -11.79013714))
            ThreePointArc((-1.452829324, -11.79013714), (-1.203206654, -11.602792602), (-0.957638625, -11.410163953))
        make_face()
    # profile 9 of 11: a face of its own
    with BuildSketch(Plane(origin=(0, 0, 0), x_dir=(1, 0, 0), z_dir=(0, 1, 0))):
        with BuildLine():
            ThreePointArc((1.683794586, -8.65351323), (1.018855105, -7.48132754), (0.084372603, -6.510293938))
            ThreePointArc((0.084372603, -6.510293938), (-0.512518948, -7.361599771), (-1.180330337, -8.158486898))
            ThreePointArc((-1.180330337, -8.158486898), (-0.000522033, -8.809805691), (1.303821399, -9.148703928))
            ThreePointArc((1.303821399, -9.148703928), (1.496450048, -8.903135899), (1.683794586, -8.65351323))
        make_face()
    # profile 10 of 11: a face of its own
    with BuildSketch(Plane(origin=(0, 0, 0), x_dir=(1, 0, 0), z_dir=(0, 1, 0))):
        with Locations((-16.573499281, -2.678784027)):
            Circle(CUT_EXTRUDE1_OUTLINE_R)
    # profile 11 of 11: a face of its own
    with BuildSketch(Plane(origin=(0, 0, 0), x_dir=(1, 0, 0), z_dir=(0, 1, 0))):
        with Locations((-3.639185826, 2.678784027)):
            Circle(CUT_EXTRUDE1_OUTLINE_R)
    extrude(amount=CUT_EXTRUDE1_DEPTH, mode=Mode.SUBTRACT)


with BuildPart() as part_1:
    # Scale1: scaled about (-15.682514655, 1.5, 1.664027293)
    add(part.part.scale(SCALE1_SCALE).moved(Location((-1.742501628, 0.166666667, 0.184891921))))

    # Sketch5 → Boss-Extrude3 (add)
    with BuildSketch(Plane(origin=(0, 2.833333333, 0), x_dir=(1, 0, 0), z_dir=(0, 1, 0)).offset(BOSS_EXTRUDE3_START)):
        with Locations((-16.47450099, -2.566033278)):
            Circle(SKETCH5_R)
        with Locations((-4.977333474, 2.196249436)):
            Circle(SKETCH5_R)
    extrude(amount=BOSS_EXTRUDE3_DEPTH)

    # Sketch6 → Cut-Extrude2 (cut)
    with BuildSketch(Plane(origin=(0, 2.833333333, 0), x_dir=(1, 0, 0), z_dir=(0, 1, 0))):
        with Locations(Location((-17.770445964, -3.102831263, 0), (0, 0, 270))):
            Circle(SKETCH6_R)
        with Locations(Location((-4.836132509, 2.25473679, 0), (0, 0, 270))):
            Circle(SKETCH6_R)
    extrude(amount=-CUT_EXTRUDE2_DEPTH, mode=Mode.SUBTRACT)


solid = part_1.part
